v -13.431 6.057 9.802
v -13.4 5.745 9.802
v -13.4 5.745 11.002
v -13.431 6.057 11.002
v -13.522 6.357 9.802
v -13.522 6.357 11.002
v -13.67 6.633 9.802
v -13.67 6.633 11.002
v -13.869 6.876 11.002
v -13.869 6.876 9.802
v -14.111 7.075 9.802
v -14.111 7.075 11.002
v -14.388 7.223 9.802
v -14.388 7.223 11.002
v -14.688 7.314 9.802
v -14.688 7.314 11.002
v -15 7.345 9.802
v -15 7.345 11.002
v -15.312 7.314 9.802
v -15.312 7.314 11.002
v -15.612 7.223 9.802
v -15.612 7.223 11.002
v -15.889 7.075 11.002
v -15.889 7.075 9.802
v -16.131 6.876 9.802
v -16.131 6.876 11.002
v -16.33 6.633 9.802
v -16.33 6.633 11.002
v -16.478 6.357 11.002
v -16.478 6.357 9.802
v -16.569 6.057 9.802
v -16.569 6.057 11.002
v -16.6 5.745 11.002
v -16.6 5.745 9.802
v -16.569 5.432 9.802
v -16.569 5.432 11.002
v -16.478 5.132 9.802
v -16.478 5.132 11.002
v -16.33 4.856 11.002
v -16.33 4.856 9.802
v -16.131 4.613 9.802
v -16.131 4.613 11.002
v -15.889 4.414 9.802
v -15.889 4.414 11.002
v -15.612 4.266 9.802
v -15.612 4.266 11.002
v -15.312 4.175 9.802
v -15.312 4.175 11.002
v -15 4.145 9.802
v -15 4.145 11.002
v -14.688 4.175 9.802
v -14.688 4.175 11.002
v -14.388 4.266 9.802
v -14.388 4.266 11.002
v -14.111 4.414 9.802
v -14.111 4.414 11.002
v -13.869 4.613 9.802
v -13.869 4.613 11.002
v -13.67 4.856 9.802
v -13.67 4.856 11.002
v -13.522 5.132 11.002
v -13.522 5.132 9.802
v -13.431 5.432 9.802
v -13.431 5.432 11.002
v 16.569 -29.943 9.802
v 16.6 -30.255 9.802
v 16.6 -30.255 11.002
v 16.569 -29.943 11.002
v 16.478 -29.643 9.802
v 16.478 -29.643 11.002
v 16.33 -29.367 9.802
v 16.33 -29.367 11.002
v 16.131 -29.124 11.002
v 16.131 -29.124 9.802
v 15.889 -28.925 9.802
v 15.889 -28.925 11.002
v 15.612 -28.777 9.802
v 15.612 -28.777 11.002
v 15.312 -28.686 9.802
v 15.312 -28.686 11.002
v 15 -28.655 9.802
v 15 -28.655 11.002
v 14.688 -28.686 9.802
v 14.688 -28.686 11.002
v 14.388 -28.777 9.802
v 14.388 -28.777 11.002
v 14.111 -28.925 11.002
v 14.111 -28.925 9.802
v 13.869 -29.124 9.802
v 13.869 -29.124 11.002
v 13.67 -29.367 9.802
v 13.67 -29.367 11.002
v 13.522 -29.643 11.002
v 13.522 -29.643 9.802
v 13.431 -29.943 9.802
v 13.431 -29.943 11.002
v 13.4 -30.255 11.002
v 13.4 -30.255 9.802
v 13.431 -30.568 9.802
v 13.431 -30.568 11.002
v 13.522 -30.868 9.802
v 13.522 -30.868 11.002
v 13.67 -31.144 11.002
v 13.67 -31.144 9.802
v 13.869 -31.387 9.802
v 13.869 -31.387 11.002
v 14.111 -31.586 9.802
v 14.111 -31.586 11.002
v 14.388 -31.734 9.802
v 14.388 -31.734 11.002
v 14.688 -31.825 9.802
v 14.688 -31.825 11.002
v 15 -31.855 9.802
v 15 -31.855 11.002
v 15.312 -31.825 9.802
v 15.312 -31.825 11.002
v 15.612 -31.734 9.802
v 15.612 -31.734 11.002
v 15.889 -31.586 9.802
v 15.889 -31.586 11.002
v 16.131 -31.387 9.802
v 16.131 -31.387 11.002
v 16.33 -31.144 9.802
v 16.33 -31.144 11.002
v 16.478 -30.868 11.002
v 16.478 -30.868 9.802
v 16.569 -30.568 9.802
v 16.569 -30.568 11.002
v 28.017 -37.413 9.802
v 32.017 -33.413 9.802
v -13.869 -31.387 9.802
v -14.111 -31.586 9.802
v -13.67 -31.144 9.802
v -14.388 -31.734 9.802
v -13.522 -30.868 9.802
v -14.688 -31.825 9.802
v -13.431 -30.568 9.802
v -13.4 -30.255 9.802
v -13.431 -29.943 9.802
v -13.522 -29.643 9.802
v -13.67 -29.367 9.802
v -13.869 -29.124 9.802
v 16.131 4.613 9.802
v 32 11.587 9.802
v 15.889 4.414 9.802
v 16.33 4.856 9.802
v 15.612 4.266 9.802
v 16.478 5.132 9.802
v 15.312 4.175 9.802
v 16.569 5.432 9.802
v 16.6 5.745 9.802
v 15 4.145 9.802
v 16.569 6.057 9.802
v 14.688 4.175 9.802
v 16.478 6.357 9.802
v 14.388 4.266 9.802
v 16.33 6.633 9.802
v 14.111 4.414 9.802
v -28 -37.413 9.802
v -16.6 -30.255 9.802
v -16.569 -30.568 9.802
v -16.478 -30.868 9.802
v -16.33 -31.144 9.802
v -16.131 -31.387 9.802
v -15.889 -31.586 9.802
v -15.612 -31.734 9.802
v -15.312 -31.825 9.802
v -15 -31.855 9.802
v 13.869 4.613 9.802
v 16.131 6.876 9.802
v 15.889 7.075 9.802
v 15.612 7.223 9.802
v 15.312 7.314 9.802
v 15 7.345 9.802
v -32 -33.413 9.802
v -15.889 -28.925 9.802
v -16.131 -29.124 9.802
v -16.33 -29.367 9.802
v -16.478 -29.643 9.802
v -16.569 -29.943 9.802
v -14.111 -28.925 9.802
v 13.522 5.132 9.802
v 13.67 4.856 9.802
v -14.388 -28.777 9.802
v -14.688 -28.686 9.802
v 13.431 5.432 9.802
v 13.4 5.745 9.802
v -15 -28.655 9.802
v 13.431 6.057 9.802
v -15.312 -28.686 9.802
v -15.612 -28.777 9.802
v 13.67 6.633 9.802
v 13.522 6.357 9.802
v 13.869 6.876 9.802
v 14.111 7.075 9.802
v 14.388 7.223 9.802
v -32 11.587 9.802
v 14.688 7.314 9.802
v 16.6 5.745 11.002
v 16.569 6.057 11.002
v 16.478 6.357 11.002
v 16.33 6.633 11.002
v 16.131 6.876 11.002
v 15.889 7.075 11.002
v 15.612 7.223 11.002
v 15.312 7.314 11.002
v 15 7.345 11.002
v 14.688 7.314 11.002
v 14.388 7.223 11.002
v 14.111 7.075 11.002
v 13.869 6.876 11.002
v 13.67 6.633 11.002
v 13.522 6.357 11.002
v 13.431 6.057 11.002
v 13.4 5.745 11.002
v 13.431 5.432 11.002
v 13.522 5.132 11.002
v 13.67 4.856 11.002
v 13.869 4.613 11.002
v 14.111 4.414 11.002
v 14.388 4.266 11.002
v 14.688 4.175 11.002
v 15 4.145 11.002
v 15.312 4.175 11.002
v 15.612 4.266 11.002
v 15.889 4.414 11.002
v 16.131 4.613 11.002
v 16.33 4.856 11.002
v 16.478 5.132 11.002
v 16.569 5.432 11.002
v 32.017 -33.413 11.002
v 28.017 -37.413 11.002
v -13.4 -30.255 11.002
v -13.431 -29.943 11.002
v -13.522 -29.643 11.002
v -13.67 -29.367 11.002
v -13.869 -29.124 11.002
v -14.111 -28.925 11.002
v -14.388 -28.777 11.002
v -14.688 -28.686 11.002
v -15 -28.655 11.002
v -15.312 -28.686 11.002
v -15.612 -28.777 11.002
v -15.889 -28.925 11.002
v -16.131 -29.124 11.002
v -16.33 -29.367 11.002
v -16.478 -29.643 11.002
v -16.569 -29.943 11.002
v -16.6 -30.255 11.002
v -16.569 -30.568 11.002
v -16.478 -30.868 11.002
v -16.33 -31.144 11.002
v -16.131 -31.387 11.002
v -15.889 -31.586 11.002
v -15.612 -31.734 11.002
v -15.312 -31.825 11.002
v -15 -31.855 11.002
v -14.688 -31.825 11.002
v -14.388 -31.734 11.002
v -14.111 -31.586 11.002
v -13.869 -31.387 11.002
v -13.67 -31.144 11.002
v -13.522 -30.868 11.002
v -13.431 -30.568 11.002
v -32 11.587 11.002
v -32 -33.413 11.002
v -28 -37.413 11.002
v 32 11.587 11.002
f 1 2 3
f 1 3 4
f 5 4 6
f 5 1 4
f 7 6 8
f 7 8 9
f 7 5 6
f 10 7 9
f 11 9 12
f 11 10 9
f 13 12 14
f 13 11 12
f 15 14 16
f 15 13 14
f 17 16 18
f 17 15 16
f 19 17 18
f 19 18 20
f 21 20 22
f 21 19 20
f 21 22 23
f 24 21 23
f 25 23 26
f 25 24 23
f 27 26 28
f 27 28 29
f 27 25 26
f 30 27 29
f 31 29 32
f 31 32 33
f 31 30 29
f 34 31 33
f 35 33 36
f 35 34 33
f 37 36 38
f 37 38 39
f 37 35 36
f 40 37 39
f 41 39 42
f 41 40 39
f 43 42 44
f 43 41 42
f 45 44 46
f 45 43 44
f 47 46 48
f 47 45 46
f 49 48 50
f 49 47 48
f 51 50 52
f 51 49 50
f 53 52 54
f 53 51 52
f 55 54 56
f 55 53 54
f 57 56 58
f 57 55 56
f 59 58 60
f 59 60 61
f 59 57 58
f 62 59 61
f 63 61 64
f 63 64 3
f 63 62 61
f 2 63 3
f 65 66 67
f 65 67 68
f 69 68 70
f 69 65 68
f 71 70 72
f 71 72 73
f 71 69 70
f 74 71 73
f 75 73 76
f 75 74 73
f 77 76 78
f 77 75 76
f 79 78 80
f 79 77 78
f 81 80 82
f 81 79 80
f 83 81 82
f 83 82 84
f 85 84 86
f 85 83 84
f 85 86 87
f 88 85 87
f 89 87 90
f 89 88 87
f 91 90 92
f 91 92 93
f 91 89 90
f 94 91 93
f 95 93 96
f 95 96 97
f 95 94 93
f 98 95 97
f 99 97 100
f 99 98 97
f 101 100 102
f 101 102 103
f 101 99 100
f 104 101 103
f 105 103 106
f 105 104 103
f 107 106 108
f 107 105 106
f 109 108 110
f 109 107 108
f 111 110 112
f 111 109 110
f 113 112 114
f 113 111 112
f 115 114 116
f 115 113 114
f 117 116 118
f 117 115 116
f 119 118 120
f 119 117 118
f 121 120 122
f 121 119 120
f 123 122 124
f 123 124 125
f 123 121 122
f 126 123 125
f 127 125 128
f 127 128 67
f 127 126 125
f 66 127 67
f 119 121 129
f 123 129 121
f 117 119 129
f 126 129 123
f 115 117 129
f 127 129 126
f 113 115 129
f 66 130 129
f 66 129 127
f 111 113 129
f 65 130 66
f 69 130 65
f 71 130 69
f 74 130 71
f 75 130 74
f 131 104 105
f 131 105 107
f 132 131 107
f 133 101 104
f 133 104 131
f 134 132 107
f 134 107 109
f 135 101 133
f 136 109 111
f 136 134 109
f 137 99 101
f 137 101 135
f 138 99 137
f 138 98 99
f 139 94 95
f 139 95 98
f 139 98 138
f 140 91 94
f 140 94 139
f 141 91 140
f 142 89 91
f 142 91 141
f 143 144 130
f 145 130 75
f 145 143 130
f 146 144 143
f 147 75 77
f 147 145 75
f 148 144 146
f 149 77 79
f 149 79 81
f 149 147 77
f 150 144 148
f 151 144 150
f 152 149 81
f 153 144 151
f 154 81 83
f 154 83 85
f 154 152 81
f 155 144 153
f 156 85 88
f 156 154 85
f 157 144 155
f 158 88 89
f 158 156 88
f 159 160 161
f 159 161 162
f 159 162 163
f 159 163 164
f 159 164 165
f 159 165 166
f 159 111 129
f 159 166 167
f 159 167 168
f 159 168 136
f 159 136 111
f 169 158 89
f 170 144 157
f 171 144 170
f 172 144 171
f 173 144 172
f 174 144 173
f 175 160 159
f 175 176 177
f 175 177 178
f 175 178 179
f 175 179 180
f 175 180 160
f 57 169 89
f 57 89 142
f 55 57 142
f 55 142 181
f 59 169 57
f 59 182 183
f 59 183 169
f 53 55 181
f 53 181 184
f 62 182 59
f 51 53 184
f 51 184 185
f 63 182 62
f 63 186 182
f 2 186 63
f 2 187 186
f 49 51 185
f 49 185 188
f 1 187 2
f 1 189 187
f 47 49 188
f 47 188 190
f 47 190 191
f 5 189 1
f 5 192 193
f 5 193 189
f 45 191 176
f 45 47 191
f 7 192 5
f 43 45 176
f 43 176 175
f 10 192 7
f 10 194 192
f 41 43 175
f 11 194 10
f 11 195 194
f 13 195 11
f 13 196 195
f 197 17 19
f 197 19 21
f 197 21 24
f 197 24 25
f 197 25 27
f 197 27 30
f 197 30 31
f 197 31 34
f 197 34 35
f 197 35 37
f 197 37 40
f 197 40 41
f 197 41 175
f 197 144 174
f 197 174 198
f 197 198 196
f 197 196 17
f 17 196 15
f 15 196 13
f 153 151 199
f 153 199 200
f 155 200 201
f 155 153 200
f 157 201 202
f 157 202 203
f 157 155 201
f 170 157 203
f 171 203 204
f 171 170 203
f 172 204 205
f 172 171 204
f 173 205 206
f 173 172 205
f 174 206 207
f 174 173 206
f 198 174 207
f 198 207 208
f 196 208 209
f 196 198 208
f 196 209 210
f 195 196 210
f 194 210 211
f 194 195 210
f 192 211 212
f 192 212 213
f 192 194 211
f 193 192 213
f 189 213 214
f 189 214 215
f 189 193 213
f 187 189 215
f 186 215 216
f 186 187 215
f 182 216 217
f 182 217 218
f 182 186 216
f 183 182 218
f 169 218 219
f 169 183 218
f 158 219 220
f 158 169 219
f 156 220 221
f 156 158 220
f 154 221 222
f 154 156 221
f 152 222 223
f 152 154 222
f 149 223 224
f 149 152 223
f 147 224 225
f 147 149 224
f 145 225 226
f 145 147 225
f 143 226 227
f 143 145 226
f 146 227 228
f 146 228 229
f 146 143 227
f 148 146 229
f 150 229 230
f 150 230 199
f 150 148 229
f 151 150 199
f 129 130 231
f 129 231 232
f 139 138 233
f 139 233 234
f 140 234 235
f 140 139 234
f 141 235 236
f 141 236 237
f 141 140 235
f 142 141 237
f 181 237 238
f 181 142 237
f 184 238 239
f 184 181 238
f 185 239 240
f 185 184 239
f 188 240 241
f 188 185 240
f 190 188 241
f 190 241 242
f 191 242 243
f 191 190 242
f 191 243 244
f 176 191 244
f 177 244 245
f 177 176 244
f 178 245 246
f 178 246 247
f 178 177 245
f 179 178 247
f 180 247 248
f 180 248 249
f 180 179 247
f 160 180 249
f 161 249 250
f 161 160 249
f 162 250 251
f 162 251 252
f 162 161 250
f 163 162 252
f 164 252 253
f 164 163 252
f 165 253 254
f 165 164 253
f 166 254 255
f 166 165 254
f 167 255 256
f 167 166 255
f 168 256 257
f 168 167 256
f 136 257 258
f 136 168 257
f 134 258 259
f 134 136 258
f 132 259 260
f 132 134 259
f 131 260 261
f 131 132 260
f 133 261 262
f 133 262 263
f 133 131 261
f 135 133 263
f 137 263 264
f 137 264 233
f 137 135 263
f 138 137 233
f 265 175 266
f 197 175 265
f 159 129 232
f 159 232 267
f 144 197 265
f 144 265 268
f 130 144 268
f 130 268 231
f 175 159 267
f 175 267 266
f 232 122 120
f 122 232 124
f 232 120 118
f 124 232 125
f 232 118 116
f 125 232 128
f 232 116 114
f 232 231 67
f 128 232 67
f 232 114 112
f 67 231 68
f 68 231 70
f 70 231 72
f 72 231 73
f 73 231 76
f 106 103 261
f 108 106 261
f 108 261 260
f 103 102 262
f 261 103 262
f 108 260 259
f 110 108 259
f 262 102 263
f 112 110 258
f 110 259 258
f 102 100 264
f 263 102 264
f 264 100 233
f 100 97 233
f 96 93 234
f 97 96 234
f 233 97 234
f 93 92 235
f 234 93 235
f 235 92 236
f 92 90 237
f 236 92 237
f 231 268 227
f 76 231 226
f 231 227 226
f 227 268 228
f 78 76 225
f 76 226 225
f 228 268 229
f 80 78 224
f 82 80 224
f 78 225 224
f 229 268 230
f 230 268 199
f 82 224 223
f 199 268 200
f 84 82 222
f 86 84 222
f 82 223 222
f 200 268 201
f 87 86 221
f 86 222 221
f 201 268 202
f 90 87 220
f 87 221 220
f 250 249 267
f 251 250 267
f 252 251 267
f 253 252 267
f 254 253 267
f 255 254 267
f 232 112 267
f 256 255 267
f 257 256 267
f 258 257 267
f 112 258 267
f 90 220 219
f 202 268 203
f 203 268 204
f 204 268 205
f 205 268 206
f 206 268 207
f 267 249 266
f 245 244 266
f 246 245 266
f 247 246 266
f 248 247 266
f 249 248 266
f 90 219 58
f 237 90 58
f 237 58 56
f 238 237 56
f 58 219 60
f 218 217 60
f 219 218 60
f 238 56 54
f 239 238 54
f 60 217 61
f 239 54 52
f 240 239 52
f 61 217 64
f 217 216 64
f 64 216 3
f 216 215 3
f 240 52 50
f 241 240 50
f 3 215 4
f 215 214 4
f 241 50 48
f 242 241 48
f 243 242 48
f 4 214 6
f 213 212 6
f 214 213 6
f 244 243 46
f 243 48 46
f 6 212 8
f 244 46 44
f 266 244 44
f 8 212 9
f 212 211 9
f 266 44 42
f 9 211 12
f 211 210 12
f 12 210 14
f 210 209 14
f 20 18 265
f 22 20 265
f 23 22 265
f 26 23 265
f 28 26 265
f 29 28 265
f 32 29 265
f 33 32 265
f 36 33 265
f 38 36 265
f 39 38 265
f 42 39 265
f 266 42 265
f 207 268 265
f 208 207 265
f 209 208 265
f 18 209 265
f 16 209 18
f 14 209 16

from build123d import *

# Parameters (mm, degrees)
SKETCH2_R           = 1.6
BOSS_EXTRUDE1_DEPTH = 1.2


with BuildPart() as part:
    # Sketch2 → Boss-Extrude1 (new body)
    with BuildSketch(Plane.XY.offset(9.801785136)):
        Polygon((-28, -37.413217807), (-32, -33.413217807), (-32, 11.586782193), (32, 11.586782193), (32.017485427, -33.413217807), (28.017485427, -37.413217807), align=None)
        with Locations((-15, 5.74456922)):
            Circle(SKETCH2_R, mode=Mode.SUBTRACT)
        with Locations((15, 5.74456922)):
            Circle(SKETCH2_R, mode=Mode.SUBTRACT)
        with Locations((-15, -30.25543078)):
            Circle(SKETCH2_R, mode=Mode.SUBTRACT)
        with Locations((15, -30.25543078)):
            Circle(SKETCH2_R, mode=Mode.SUBTRACT)
    extrude(amount=BOSS_EXTRUDE1_DEPTH)


solid = part.part
